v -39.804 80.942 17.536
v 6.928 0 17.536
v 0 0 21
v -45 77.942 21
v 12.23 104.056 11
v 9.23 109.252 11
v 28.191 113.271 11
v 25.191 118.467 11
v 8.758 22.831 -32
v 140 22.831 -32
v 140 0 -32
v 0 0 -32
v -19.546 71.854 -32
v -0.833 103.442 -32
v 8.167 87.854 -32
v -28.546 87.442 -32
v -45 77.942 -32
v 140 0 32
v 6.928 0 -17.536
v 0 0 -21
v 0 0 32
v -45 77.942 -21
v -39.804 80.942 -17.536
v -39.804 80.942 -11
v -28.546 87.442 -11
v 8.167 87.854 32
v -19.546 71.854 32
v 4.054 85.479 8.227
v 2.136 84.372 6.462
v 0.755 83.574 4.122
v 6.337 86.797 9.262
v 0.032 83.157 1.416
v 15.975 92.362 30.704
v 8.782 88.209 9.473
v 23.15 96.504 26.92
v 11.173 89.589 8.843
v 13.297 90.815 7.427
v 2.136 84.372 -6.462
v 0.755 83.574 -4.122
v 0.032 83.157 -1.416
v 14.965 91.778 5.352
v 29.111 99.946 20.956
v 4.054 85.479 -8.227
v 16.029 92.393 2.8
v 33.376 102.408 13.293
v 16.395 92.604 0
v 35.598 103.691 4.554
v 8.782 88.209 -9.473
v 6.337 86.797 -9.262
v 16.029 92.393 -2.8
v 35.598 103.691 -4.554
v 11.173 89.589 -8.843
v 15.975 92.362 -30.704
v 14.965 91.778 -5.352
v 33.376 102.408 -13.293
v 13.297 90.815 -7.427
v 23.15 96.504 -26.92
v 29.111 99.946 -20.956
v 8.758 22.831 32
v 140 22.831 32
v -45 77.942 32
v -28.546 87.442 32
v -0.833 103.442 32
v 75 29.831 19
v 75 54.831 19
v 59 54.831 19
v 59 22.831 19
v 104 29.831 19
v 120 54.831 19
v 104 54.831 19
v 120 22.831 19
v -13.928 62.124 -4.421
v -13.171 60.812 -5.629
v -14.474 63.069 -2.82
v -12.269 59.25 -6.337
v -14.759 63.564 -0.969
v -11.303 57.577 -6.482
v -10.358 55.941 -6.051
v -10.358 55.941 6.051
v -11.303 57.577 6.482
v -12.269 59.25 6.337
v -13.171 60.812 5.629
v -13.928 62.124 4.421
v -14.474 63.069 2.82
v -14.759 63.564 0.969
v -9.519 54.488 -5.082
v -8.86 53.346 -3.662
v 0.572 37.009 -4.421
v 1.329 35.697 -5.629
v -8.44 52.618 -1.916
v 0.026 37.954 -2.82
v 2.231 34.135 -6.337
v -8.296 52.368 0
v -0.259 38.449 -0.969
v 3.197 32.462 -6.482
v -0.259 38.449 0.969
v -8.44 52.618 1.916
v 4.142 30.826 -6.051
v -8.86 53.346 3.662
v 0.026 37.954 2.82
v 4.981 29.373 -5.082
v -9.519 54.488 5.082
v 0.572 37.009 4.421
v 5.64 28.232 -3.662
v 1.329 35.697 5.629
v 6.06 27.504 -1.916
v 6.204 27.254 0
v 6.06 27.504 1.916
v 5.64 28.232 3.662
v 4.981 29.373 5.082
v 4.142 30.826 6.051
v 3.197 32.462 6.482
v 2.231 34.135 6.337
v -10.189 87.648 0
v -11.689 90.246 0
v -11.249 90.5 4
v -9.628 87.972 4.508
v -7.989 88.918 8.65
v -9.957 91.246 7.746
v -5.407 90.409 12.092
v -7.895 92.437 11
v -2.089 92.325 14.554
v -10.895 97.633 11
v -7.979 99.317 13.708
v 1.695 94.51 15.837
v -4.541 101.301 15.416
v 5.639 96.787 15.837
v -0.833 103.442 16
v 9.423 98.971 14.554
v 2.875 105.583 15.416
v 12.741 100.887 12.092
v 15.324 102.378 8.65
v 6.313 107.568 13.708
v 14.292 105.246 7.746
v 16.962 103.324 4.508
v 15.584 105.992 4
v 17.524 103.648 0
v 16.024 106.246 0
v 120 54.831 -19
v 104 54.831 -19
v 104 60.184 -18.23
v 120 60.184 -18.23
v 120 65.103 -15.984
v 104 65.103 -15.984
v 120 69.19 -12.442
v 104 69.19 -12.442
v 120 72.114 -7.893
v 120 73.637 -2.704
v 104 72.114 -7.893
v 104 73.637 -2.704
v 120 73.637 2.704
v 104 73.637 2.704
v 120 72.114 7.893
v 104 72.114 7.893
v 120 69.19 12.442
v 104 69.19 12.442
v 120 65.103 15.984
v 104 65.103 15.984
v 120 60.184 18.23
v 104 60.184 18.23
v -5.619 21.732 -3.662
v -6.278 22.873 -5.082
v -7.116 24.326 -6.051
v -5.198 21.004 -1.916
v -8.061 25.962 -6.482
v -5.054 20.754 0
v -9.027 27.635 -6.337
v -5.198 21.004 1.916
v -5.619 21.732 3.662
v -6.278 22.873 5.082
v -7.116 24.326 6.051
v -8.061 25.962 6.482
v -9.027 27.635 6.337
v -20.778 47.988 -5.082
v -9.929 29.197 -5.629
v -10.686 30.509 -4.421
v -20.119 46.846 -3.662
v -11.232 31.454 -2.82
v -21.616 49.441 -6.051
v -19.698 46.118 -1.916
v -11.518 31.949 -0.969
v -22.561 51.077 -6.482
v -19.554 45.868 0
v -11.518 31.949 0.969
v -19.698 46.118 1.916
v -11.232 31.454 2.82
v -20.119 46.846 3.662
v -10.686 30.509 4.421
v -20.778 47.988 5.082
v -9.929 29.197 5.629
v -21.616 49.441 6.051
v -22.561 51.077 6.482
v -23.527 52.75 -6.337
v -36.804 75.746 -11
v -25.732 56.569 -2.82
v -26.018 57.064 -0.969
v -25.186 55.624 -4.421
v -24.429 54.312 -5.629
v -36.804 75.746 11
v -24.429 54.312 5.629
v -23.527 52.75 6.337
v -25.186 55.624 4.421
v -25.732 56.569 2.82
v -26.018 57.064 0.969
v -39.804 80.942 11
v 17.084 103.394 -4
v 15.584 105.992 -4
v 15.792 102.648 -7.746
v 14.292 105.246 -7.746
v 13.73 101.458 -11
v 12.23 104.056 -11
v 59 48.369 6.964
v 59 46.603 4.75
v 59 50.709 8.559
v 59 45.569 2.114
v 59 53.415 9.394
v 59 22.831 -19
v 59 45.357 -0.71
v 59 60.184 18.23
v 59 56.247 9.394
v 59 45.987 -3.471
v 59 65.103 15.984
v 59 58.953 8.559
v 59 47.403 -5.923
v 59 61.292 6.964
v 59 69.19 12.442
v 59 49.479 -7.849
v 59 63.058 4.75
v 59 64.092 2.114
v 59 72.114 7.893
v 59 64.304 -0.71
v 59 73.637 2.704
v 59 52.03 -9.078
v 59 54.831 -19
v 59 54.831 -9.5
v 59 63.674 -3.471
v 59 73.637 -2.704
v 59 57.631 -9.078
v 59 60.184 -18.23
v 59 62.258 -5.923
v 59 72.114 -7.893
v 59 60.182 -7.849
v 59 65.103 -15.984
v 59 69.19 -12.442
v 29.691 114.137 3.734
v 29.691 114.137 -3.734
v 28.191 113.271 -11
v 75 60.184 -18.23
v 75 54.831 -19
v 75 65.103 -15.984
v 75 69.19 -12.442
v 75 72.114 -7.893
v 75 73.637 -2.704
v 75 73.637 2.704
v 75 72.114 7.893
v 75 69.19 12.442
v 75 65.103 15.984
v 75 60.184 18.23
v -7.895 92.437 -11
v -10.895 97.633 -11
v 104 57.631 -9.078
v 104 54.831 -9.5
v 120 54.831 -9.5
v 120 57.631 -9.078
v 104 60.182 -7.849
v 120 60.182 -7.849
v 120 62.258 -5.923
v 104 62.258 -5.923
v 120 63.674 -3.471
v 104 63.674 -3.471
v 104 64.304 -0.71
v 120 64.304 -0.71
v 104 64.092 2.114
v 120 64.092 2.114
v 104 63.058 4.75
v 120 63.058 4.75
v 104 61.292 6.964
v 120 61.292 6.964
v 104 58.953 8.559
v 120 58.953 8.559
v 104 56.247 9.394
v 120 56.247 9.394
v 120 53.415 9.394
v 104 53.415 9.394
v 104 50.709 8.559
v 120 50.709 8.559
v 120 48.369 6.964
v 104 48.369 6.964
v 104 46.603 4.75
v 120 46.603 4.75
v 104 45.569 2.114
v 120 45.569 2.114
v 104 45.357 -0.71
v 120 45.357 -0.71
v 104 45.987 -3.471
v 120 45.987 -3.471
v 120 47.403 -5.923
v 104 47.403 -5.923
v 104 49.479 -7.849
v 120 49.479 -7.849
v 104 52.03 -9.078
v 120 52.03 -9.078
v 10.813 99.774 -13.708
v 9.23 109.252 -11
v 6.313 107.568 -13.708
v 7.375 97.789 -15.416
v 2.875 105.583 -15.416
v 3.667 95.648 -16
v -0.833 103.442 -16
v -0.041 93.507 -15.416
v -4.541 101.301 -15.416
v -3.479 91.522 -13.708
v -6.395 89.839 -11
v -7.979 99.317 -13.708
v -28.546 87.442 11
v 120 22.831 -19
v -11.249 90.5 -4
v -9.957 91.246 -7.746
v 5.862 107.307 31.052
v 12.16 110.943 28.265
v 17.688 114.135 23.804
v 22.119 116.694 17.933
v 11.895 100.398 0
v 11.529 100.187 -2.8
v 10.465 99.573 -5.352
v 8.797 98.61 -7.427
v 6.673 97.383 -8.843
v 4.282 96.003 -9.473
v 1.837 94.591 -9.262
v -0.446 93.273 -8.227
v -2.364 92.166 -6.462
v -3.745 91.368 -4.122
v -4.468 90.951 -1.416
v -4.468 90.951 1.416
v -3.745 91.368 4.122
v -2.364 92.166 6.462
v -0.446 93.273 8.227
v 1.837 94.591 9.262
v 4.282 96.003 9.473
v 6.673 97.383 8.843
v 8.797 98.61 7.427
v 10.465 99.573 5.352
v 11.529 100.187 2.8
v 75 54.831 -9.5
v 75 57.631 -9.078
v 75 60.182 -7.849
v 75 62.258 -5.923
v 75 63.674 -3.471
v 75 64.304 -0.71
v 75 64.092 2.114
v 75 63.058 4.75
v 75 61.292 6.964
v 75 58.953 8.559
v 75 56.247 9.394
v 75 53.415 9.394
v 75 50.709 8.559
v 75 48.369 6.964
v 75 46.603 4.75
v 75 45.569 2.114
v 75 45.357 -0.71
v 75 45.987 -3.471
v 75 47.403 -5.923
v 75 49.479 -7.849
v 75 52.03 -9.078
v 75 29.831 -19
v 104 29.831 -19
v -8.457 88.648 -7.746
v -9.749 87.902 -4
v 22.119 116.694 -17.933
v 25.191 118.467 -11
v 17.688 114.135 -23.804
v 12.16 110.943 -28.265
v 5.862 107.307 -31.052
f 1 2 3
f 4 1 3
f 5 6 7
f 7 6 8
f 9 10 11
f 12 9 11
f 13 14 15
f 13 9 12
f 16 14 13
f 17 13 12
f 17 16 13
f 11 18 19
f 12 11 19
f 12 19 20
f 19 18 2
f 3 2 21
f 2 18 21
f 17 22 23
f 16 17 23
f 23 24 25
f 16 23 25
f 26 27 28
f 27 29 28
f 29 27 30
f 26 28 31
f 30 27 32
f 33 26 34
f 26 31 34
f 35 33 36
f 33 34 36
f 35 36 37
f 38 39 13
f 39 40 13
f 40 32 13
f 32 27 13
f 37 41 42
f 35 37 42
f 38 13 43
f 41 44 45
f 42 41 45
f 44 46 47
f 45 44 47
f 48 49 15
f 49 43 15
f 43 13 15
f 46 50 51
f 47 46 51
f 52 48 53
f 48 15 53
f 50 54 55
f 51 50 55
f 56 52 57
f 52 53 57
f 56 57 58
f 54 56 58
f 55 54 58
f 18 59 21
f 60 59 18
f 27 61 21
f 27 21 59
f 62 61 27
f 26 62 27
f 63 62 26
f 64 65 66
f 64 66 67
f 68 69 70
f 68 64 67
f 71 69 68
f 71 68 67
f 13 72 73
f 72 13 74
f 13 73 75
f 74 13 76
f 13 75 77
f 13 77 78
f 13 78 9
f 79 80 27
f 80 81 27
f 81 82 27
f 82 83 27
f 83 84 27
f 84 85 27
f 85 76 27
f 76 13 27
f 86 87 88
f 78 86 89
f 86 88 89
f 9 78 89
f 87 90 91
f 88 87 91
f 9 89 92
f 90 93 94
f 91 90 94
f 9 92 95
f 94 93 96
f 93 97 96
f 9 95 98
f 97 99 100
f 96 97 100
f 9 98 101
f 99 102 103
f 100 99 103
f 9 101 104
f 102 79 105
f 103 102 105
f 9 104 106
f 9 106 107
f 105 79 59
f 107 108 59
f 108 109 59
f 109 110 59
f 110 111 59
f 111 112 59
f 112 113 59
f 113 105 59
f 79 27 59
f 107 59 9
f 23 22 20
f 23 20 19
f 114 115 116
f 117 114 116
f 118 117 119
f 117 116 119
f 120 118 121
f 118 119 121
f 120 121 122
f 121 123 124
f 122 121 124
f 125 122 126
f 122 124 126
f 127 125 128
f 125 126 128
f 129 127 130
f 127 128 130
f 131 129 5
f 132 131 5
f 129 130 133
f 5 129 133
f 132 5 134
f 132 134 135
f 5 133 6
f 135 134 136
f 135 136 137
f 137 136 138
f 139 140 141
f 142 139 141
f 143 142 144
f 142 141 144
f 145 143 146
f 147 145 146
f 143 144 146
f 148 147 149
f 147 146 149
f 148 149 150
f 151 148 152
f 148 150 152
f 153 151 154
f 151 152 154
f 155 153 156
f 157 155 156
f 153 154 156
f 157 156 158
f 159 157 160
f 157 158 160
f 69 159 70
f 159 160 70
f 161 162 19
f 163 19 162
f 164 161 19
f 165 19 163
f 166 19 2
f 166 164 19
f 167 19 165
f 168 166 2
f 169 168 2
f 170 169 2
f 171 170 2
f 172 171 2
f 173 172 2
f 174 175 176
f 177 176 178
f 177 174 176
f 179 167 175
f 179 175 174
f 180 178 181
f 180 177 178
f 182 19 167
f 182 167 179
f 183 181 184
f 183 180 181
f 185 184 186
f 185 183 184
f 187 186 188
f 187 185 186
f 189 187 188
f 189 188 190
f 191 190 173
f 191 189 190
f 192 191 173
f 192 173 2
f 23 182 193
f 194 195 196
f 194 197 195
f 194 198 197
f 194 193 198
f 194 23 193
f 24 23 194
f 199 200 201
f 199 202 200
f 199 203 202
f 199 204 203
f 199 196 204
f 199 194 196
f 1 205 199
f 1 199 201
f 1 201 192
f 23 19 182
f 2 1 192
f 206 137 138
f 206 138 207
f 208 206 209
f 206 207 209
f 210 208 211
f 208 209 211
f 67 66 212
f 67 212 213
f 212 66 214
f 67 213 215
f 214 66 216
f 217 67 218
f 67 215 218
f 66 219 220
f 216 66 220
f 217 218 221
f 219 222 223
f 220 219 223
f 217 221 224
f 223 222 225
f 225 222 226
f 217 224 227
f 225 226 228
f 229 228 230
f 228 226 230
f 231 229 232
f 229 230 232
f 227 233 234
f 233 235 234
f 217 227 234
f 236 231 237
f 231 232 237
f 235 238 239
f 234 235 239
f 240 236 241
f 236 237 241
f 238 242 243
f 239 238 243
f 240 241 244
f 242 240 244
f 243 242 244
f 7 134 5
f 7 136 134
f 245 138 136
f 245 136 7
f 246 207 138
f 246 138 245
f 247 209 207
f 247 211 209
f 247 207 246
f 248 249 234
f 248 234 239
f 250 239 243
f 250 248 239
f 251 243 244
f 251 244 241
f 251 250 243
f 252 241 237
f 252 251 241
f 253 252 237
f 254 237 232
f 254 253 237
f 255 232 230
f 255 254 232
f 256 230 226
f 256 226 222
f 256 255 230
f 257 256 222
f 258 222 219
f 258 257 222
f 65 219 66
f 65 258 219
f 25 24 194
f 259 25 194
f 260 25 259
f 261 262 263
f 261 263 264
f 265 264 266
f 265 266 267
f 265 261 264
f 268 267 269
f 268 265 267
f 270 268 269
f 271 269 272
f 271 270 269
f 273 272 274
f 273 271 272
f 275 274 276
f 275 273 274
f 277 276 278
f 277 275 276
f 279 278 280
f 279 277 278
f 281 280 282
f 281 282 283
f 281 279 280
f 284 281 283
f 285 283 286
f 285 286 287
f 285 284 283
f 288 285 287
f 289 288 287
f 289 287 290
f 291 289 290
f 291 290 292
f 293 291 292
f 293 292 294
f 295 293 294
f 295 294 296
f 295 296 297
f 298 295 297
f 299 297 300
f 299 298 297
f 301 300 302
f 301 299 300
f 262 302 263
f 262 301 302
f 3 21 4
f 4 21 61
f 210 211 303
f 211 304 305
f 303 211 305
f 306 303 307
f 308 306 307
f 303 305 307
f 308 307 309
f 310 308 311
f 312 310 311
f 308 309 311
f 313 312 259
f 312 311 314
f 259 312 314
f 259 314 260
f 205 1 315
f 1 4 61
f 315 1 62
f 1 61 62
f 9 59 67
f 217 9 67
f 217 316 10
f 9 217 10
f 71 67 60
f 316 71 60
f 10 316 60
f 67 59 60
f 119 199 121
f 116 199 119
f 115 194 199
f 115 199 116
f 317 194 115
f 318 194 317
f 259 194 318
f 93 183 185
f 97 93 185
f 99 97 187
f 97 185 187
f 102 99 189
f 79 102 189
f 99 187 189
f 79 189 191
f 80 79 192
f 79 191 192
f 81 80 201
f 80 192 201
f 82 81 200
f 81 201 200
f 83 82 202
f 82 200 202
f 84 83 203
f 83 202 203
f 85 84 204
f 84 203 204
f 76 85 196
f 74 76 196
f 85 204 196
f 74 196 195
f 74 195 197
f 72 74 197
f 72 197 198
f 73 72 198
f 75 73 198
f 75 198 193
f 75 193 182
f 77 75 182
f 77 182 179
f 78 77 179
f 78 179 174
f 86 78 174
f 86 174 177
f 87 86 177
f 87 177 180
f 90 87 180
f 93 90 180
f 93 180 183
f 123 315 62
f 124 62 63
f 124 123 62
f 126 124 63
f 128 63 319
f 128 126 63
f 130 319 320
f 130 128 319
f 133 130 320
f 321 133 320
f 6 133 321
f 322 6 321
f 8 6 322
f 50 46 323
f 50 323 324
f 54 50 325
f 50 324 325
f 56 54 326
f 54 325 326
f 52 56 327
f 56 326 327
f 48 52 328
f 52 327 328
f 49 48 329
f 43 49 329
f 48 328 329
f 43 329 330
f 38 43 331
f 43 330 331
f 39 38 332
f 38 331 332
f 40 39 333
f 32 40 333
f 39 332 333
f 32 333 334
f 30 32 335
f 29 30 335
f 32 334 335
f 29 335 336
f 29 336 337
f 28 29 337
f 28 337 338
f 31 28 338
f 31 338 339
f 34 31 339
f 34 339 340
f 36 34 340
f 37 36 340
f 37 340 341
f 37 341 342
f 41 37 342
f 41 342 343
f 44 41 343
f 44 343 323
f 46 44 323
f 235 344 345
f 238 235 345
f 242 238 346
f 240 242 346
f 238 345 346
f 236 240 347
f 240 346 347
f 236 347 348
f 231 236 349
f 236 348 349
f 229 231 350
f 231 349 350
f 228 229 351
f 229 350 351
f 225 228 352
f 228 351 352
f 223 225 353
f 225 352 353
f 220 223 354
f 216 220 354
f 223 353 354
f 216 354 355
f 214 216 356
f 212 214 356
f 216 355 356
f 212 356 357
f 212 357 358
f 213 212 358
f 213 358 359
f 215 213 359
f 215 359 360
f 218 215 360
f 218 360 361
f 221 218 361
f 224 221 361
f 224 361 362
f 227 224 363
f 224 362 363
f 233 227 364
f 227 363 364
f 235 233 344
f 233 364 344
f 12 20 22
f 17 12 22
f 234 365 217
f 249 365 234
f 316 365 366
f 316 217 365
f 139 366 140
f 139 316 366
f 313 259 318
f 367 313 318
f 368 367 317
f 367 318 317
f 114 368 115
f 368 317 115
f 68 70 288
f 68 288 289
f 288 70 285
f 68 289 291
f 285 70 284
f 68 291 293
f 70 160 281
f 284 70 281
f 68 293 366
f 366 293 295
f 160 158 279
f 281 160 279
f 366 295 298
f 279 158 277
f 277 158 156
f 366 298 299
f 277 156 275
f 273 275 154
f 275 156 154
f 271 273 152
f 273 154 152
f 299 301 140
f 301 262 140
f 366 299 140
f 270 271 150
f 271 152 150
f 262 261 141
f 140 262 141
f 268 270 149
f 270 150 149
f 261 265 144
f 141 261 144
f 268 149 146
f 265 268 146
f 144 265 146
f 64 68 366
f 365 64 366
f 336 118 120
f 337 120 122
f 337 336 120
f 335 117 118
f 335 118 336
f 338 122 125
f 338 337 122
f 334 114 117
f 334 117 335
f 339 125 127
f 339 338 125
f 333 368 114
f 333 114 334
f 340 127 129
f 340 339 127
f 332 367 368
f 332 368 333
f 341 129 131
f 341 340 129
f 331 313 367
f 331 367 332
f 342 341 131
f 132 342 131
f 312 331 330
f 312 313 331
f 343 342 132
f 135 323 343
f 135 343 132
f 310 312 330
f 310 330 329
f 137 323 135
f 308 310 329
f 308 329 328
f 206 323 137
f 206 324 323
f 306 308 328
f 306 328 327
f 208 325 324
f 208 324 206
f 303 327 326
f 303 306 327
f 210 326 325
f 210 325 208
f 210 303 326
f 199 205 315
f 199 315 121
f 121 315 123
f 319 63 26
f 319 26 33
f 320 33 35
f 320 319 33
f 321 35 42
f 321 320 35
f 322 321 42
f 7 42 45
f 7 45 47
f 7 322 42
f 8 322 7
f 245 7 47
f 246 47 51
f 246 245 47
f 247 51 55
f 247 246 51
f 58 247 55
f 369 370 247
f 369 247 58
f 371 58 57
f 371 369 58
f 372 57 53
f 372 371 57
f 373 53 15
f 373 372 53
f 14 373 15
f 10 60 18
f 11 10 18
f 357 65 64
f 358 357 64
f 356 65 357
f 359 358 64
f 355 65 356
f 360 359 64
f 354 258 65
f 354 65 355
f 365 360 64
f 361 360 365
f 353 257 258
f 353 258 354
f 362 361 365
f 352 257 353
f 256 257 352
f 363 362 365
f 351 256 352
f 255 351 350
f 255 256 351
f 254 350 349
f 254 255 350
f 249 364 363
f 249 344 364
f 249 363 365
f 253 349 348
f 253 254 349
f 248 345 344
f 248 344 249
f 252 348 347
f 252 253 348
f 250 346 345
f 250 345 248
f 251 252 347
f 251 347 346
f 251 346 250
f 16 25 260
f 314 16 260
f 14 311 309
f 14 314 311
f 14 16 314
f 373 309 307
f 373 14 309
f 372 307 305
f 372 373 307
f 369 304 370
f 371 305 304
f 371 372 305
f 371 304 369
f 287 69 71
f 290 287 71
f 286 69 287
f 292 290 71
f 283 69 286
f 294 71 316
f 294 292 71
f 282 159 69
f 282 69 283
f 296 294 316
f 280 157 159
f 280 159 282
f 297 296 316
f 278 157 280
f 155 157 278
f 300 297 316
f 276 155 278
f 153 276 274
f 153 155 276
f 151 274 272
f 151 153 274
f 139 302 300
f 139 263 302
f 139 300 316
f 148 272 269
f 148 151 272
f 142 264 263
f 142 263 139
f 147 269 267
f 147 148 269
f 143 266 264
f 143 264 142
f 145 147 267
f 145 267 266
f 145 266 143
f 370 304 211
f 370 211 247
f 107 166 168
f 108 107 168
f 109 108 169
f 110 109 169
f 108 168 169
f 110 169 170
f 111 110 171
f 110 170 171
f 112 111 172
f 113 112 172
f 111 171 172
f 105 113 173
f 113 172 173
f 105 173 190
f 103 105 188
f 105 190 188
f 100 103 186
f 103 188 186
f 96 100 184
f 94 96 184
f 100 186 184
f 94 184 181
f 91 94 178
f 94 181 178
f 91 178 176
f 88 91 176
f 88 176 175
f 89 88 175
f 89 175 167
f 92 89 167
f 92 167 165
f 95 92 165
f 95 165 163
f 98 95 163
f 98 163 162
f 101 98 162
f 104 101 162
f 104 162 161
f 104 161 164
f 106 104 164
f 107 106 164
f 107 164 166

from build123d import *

# Parameters (mm, degrees)
EXTRUDE_1_DEPTH     = 32
EXTRUDE_2_DEPTH     = 18
CUT_EXTRUDE_1_DEPTH = 204.283053893
SKETCH_5_W          = 110.763550328
SKETCH_5_H          = 22
CUT_EXTRUDE_2_DEPTH = 6
SKETCH_6_R          = 9.5
CUT_EXTRUDE_3_DEPTH = 36
SKETCH_6_3_R        = 16
CUT_EXTRUDE_4_DEPTH = 9
SKETCH_7_R          = 6.5
CUT_EXTRUDE_5_DEPTH = 181.357330689
SKETCH_8_W          = 38
SKETCH_8_H          = 7
EXTRUDE_3_DEPTH     = 30.5
EXTRUDE_START       = 14.5
SKETCH_8_3_R        = 9.5
EXTRUDE_4_DEPTH     = 16


with BuildPart() as part:
    # 草圖1 → 填料-伸長1 (new, symmetric)
    with BuildSketch(Plane.XY):
        Polygon((0, 0), (-45, 77.942286341), (-28.545517328, 87.442286341), (8.758035362, 22.830637779), (140, 22.830637779), (140, 0), align=None)
    extrude(amount=EXTRUDE_1_DEPTH, both=True)

    # 草圖2 → 填料-伸長2 (add)
    with BuildSketch(Plane(origin=(-45, 77.942286341, 0), x_dir=(0.8660254037844364, 0.5000000000000041, 0), z_dir=(-0.500000000000004, 0.8660254037844363, 0))):
        with BuildLine():
            Line((19, 32), (19, -32))
            Line((19, -32), (51, -32))
            ThreePointArc((51, -32), (83, 0), (51, 32))
            Line((51, 32), (19, 32))
        make_face()
    extrude(amount=-EXTRUDE_2_DEPTH)

    # 草圖4 → 除料-伸長1 (cut, through all)
    with BuildSketch(Plane(origin=(-45, 77.942286341, 0), x_dir=(0.8660254037844364, 0.5000000000000041, 0), z_dir=(-0.500000000000004, 0.8660254037844363, 0))):
        Polygon((0, 21), (6, 17.535898385), (6, -17.535898385), (0, -21), align=None)
    extrude(amount=-CUT_EXTRUDE_1_DEPTH, mode=Mode.SUBTRACT)

    # 草圖5 → 除料-伸長2 (cut)
    with BuildSketch(Plane(origin=(-45, 77.942286341, 0), x_dir=(0.8660254037844364, 0.5000000000000041, 0), z_dir=(-0.500000000000004, 0.8660254037844363, 0))):
        with Locations((41.909126347, 0)):
            Rectangle(SKETCH_5_W, SKETCH_5_H)
    extrude(amount=-CUT_EXTRUDE_2_DEPTH, mode=Mode.SUBTRACT)

    # 草圖6 → 除料-伸長3 (cut)
    with BuildSketch(Plane(origin=(-45, 77.942286341, 0), x_dir=(0.8660254037844364, 0.5000000000000041, 0), z_dir=(-0.500000000000004, 0.8660254037844363, 0))):
        with Locations((51, 0)):
            Circle(SKETCH_6_R)
    extrude(amount=-CUT_EXTRUDE_3_DEPTH, mode=Mode.SUBTRACT)

    # 草圖6<3> → 除料-伸長4 (cut)
    with BuildSketch(Plane(origin=(-45, 77.942286341, 0), x_dir=(0.8660254037844364, 0.5000000000000041, 0), z_dir=(-0.500000000000004, 0.8660254037844363, 0))):
        with Locations((51, 0)):
            Circle(SKETCH_6_3_R)
    extrude(amount=-CUT_EXTRUDE_4_DEPTH, mode=Mode.SUBTRACT)

    # 草圖7 → 除料-伸長5 (cut, through all)
    with BuildSketch(Plane(origin=(5.196152423, 3, 0), x_dir=(0, 0, 1), z_dir=(-0.8660254037844365, -0.500000000000004, 0))):
        with Locations((0, 56)):
            Circle(SKETCH_7_R)
        with Locations((0, 27)):
            Circle(SKETCH_7_R)
    extrude(amount=-CUT_EXTRUDE_5_DEPTH, mode=Mode.SUBTRACT)

    # 草圖8 → 填料-伸長3 (add, symmetric)
    with BuildSketch(Plane(origin=(89.5, 0, 0), x_dir=(0, 0, -1), z_dir=(1, 0, 0))):
        with Locations((0, 26.330637779)):
            Rectangle(SKETCH_8_W, SKETCH_8_H)
    extrude(amount=EXTRUDE_3_DEPTH, both=True)

    # 草圖8<3> → 填料-伸長4 (add)
    with BuildSketch(Plane(origin=(89.5, 0, 0), x_dir=(0, 0, -1), z_dir=(1, 0, 0)).offset(EXTRUDE_START)):
        with BuildLine():
            Line((-19, 54.830637779), (-19, 29.830637779))
            Line((-19, 29.830637779), (19, 29.830637779))
            Line((19, 29.830637779), (19, 54.830637779))
            ThreePointArc((19, 54.830637779), (0, 73.830637779), (-19, 54.830637779))
        make_face()
        with Locations((0, 54.830637779)):
            Circle(SKETCH_8_3_R, mode=Mode.SUBTRACT)
    extrude_4 = extrude(amount=EXTRUDE_4_DEPTH)

    # 鏡射1: 填料-伸長4 across plane
    add(extrude_4.mirror(Plane(origin=(89.5, 0, 0), x_dir=(0, 0, 1), z_dir=(1, 0, 0))))


solid = part.part
